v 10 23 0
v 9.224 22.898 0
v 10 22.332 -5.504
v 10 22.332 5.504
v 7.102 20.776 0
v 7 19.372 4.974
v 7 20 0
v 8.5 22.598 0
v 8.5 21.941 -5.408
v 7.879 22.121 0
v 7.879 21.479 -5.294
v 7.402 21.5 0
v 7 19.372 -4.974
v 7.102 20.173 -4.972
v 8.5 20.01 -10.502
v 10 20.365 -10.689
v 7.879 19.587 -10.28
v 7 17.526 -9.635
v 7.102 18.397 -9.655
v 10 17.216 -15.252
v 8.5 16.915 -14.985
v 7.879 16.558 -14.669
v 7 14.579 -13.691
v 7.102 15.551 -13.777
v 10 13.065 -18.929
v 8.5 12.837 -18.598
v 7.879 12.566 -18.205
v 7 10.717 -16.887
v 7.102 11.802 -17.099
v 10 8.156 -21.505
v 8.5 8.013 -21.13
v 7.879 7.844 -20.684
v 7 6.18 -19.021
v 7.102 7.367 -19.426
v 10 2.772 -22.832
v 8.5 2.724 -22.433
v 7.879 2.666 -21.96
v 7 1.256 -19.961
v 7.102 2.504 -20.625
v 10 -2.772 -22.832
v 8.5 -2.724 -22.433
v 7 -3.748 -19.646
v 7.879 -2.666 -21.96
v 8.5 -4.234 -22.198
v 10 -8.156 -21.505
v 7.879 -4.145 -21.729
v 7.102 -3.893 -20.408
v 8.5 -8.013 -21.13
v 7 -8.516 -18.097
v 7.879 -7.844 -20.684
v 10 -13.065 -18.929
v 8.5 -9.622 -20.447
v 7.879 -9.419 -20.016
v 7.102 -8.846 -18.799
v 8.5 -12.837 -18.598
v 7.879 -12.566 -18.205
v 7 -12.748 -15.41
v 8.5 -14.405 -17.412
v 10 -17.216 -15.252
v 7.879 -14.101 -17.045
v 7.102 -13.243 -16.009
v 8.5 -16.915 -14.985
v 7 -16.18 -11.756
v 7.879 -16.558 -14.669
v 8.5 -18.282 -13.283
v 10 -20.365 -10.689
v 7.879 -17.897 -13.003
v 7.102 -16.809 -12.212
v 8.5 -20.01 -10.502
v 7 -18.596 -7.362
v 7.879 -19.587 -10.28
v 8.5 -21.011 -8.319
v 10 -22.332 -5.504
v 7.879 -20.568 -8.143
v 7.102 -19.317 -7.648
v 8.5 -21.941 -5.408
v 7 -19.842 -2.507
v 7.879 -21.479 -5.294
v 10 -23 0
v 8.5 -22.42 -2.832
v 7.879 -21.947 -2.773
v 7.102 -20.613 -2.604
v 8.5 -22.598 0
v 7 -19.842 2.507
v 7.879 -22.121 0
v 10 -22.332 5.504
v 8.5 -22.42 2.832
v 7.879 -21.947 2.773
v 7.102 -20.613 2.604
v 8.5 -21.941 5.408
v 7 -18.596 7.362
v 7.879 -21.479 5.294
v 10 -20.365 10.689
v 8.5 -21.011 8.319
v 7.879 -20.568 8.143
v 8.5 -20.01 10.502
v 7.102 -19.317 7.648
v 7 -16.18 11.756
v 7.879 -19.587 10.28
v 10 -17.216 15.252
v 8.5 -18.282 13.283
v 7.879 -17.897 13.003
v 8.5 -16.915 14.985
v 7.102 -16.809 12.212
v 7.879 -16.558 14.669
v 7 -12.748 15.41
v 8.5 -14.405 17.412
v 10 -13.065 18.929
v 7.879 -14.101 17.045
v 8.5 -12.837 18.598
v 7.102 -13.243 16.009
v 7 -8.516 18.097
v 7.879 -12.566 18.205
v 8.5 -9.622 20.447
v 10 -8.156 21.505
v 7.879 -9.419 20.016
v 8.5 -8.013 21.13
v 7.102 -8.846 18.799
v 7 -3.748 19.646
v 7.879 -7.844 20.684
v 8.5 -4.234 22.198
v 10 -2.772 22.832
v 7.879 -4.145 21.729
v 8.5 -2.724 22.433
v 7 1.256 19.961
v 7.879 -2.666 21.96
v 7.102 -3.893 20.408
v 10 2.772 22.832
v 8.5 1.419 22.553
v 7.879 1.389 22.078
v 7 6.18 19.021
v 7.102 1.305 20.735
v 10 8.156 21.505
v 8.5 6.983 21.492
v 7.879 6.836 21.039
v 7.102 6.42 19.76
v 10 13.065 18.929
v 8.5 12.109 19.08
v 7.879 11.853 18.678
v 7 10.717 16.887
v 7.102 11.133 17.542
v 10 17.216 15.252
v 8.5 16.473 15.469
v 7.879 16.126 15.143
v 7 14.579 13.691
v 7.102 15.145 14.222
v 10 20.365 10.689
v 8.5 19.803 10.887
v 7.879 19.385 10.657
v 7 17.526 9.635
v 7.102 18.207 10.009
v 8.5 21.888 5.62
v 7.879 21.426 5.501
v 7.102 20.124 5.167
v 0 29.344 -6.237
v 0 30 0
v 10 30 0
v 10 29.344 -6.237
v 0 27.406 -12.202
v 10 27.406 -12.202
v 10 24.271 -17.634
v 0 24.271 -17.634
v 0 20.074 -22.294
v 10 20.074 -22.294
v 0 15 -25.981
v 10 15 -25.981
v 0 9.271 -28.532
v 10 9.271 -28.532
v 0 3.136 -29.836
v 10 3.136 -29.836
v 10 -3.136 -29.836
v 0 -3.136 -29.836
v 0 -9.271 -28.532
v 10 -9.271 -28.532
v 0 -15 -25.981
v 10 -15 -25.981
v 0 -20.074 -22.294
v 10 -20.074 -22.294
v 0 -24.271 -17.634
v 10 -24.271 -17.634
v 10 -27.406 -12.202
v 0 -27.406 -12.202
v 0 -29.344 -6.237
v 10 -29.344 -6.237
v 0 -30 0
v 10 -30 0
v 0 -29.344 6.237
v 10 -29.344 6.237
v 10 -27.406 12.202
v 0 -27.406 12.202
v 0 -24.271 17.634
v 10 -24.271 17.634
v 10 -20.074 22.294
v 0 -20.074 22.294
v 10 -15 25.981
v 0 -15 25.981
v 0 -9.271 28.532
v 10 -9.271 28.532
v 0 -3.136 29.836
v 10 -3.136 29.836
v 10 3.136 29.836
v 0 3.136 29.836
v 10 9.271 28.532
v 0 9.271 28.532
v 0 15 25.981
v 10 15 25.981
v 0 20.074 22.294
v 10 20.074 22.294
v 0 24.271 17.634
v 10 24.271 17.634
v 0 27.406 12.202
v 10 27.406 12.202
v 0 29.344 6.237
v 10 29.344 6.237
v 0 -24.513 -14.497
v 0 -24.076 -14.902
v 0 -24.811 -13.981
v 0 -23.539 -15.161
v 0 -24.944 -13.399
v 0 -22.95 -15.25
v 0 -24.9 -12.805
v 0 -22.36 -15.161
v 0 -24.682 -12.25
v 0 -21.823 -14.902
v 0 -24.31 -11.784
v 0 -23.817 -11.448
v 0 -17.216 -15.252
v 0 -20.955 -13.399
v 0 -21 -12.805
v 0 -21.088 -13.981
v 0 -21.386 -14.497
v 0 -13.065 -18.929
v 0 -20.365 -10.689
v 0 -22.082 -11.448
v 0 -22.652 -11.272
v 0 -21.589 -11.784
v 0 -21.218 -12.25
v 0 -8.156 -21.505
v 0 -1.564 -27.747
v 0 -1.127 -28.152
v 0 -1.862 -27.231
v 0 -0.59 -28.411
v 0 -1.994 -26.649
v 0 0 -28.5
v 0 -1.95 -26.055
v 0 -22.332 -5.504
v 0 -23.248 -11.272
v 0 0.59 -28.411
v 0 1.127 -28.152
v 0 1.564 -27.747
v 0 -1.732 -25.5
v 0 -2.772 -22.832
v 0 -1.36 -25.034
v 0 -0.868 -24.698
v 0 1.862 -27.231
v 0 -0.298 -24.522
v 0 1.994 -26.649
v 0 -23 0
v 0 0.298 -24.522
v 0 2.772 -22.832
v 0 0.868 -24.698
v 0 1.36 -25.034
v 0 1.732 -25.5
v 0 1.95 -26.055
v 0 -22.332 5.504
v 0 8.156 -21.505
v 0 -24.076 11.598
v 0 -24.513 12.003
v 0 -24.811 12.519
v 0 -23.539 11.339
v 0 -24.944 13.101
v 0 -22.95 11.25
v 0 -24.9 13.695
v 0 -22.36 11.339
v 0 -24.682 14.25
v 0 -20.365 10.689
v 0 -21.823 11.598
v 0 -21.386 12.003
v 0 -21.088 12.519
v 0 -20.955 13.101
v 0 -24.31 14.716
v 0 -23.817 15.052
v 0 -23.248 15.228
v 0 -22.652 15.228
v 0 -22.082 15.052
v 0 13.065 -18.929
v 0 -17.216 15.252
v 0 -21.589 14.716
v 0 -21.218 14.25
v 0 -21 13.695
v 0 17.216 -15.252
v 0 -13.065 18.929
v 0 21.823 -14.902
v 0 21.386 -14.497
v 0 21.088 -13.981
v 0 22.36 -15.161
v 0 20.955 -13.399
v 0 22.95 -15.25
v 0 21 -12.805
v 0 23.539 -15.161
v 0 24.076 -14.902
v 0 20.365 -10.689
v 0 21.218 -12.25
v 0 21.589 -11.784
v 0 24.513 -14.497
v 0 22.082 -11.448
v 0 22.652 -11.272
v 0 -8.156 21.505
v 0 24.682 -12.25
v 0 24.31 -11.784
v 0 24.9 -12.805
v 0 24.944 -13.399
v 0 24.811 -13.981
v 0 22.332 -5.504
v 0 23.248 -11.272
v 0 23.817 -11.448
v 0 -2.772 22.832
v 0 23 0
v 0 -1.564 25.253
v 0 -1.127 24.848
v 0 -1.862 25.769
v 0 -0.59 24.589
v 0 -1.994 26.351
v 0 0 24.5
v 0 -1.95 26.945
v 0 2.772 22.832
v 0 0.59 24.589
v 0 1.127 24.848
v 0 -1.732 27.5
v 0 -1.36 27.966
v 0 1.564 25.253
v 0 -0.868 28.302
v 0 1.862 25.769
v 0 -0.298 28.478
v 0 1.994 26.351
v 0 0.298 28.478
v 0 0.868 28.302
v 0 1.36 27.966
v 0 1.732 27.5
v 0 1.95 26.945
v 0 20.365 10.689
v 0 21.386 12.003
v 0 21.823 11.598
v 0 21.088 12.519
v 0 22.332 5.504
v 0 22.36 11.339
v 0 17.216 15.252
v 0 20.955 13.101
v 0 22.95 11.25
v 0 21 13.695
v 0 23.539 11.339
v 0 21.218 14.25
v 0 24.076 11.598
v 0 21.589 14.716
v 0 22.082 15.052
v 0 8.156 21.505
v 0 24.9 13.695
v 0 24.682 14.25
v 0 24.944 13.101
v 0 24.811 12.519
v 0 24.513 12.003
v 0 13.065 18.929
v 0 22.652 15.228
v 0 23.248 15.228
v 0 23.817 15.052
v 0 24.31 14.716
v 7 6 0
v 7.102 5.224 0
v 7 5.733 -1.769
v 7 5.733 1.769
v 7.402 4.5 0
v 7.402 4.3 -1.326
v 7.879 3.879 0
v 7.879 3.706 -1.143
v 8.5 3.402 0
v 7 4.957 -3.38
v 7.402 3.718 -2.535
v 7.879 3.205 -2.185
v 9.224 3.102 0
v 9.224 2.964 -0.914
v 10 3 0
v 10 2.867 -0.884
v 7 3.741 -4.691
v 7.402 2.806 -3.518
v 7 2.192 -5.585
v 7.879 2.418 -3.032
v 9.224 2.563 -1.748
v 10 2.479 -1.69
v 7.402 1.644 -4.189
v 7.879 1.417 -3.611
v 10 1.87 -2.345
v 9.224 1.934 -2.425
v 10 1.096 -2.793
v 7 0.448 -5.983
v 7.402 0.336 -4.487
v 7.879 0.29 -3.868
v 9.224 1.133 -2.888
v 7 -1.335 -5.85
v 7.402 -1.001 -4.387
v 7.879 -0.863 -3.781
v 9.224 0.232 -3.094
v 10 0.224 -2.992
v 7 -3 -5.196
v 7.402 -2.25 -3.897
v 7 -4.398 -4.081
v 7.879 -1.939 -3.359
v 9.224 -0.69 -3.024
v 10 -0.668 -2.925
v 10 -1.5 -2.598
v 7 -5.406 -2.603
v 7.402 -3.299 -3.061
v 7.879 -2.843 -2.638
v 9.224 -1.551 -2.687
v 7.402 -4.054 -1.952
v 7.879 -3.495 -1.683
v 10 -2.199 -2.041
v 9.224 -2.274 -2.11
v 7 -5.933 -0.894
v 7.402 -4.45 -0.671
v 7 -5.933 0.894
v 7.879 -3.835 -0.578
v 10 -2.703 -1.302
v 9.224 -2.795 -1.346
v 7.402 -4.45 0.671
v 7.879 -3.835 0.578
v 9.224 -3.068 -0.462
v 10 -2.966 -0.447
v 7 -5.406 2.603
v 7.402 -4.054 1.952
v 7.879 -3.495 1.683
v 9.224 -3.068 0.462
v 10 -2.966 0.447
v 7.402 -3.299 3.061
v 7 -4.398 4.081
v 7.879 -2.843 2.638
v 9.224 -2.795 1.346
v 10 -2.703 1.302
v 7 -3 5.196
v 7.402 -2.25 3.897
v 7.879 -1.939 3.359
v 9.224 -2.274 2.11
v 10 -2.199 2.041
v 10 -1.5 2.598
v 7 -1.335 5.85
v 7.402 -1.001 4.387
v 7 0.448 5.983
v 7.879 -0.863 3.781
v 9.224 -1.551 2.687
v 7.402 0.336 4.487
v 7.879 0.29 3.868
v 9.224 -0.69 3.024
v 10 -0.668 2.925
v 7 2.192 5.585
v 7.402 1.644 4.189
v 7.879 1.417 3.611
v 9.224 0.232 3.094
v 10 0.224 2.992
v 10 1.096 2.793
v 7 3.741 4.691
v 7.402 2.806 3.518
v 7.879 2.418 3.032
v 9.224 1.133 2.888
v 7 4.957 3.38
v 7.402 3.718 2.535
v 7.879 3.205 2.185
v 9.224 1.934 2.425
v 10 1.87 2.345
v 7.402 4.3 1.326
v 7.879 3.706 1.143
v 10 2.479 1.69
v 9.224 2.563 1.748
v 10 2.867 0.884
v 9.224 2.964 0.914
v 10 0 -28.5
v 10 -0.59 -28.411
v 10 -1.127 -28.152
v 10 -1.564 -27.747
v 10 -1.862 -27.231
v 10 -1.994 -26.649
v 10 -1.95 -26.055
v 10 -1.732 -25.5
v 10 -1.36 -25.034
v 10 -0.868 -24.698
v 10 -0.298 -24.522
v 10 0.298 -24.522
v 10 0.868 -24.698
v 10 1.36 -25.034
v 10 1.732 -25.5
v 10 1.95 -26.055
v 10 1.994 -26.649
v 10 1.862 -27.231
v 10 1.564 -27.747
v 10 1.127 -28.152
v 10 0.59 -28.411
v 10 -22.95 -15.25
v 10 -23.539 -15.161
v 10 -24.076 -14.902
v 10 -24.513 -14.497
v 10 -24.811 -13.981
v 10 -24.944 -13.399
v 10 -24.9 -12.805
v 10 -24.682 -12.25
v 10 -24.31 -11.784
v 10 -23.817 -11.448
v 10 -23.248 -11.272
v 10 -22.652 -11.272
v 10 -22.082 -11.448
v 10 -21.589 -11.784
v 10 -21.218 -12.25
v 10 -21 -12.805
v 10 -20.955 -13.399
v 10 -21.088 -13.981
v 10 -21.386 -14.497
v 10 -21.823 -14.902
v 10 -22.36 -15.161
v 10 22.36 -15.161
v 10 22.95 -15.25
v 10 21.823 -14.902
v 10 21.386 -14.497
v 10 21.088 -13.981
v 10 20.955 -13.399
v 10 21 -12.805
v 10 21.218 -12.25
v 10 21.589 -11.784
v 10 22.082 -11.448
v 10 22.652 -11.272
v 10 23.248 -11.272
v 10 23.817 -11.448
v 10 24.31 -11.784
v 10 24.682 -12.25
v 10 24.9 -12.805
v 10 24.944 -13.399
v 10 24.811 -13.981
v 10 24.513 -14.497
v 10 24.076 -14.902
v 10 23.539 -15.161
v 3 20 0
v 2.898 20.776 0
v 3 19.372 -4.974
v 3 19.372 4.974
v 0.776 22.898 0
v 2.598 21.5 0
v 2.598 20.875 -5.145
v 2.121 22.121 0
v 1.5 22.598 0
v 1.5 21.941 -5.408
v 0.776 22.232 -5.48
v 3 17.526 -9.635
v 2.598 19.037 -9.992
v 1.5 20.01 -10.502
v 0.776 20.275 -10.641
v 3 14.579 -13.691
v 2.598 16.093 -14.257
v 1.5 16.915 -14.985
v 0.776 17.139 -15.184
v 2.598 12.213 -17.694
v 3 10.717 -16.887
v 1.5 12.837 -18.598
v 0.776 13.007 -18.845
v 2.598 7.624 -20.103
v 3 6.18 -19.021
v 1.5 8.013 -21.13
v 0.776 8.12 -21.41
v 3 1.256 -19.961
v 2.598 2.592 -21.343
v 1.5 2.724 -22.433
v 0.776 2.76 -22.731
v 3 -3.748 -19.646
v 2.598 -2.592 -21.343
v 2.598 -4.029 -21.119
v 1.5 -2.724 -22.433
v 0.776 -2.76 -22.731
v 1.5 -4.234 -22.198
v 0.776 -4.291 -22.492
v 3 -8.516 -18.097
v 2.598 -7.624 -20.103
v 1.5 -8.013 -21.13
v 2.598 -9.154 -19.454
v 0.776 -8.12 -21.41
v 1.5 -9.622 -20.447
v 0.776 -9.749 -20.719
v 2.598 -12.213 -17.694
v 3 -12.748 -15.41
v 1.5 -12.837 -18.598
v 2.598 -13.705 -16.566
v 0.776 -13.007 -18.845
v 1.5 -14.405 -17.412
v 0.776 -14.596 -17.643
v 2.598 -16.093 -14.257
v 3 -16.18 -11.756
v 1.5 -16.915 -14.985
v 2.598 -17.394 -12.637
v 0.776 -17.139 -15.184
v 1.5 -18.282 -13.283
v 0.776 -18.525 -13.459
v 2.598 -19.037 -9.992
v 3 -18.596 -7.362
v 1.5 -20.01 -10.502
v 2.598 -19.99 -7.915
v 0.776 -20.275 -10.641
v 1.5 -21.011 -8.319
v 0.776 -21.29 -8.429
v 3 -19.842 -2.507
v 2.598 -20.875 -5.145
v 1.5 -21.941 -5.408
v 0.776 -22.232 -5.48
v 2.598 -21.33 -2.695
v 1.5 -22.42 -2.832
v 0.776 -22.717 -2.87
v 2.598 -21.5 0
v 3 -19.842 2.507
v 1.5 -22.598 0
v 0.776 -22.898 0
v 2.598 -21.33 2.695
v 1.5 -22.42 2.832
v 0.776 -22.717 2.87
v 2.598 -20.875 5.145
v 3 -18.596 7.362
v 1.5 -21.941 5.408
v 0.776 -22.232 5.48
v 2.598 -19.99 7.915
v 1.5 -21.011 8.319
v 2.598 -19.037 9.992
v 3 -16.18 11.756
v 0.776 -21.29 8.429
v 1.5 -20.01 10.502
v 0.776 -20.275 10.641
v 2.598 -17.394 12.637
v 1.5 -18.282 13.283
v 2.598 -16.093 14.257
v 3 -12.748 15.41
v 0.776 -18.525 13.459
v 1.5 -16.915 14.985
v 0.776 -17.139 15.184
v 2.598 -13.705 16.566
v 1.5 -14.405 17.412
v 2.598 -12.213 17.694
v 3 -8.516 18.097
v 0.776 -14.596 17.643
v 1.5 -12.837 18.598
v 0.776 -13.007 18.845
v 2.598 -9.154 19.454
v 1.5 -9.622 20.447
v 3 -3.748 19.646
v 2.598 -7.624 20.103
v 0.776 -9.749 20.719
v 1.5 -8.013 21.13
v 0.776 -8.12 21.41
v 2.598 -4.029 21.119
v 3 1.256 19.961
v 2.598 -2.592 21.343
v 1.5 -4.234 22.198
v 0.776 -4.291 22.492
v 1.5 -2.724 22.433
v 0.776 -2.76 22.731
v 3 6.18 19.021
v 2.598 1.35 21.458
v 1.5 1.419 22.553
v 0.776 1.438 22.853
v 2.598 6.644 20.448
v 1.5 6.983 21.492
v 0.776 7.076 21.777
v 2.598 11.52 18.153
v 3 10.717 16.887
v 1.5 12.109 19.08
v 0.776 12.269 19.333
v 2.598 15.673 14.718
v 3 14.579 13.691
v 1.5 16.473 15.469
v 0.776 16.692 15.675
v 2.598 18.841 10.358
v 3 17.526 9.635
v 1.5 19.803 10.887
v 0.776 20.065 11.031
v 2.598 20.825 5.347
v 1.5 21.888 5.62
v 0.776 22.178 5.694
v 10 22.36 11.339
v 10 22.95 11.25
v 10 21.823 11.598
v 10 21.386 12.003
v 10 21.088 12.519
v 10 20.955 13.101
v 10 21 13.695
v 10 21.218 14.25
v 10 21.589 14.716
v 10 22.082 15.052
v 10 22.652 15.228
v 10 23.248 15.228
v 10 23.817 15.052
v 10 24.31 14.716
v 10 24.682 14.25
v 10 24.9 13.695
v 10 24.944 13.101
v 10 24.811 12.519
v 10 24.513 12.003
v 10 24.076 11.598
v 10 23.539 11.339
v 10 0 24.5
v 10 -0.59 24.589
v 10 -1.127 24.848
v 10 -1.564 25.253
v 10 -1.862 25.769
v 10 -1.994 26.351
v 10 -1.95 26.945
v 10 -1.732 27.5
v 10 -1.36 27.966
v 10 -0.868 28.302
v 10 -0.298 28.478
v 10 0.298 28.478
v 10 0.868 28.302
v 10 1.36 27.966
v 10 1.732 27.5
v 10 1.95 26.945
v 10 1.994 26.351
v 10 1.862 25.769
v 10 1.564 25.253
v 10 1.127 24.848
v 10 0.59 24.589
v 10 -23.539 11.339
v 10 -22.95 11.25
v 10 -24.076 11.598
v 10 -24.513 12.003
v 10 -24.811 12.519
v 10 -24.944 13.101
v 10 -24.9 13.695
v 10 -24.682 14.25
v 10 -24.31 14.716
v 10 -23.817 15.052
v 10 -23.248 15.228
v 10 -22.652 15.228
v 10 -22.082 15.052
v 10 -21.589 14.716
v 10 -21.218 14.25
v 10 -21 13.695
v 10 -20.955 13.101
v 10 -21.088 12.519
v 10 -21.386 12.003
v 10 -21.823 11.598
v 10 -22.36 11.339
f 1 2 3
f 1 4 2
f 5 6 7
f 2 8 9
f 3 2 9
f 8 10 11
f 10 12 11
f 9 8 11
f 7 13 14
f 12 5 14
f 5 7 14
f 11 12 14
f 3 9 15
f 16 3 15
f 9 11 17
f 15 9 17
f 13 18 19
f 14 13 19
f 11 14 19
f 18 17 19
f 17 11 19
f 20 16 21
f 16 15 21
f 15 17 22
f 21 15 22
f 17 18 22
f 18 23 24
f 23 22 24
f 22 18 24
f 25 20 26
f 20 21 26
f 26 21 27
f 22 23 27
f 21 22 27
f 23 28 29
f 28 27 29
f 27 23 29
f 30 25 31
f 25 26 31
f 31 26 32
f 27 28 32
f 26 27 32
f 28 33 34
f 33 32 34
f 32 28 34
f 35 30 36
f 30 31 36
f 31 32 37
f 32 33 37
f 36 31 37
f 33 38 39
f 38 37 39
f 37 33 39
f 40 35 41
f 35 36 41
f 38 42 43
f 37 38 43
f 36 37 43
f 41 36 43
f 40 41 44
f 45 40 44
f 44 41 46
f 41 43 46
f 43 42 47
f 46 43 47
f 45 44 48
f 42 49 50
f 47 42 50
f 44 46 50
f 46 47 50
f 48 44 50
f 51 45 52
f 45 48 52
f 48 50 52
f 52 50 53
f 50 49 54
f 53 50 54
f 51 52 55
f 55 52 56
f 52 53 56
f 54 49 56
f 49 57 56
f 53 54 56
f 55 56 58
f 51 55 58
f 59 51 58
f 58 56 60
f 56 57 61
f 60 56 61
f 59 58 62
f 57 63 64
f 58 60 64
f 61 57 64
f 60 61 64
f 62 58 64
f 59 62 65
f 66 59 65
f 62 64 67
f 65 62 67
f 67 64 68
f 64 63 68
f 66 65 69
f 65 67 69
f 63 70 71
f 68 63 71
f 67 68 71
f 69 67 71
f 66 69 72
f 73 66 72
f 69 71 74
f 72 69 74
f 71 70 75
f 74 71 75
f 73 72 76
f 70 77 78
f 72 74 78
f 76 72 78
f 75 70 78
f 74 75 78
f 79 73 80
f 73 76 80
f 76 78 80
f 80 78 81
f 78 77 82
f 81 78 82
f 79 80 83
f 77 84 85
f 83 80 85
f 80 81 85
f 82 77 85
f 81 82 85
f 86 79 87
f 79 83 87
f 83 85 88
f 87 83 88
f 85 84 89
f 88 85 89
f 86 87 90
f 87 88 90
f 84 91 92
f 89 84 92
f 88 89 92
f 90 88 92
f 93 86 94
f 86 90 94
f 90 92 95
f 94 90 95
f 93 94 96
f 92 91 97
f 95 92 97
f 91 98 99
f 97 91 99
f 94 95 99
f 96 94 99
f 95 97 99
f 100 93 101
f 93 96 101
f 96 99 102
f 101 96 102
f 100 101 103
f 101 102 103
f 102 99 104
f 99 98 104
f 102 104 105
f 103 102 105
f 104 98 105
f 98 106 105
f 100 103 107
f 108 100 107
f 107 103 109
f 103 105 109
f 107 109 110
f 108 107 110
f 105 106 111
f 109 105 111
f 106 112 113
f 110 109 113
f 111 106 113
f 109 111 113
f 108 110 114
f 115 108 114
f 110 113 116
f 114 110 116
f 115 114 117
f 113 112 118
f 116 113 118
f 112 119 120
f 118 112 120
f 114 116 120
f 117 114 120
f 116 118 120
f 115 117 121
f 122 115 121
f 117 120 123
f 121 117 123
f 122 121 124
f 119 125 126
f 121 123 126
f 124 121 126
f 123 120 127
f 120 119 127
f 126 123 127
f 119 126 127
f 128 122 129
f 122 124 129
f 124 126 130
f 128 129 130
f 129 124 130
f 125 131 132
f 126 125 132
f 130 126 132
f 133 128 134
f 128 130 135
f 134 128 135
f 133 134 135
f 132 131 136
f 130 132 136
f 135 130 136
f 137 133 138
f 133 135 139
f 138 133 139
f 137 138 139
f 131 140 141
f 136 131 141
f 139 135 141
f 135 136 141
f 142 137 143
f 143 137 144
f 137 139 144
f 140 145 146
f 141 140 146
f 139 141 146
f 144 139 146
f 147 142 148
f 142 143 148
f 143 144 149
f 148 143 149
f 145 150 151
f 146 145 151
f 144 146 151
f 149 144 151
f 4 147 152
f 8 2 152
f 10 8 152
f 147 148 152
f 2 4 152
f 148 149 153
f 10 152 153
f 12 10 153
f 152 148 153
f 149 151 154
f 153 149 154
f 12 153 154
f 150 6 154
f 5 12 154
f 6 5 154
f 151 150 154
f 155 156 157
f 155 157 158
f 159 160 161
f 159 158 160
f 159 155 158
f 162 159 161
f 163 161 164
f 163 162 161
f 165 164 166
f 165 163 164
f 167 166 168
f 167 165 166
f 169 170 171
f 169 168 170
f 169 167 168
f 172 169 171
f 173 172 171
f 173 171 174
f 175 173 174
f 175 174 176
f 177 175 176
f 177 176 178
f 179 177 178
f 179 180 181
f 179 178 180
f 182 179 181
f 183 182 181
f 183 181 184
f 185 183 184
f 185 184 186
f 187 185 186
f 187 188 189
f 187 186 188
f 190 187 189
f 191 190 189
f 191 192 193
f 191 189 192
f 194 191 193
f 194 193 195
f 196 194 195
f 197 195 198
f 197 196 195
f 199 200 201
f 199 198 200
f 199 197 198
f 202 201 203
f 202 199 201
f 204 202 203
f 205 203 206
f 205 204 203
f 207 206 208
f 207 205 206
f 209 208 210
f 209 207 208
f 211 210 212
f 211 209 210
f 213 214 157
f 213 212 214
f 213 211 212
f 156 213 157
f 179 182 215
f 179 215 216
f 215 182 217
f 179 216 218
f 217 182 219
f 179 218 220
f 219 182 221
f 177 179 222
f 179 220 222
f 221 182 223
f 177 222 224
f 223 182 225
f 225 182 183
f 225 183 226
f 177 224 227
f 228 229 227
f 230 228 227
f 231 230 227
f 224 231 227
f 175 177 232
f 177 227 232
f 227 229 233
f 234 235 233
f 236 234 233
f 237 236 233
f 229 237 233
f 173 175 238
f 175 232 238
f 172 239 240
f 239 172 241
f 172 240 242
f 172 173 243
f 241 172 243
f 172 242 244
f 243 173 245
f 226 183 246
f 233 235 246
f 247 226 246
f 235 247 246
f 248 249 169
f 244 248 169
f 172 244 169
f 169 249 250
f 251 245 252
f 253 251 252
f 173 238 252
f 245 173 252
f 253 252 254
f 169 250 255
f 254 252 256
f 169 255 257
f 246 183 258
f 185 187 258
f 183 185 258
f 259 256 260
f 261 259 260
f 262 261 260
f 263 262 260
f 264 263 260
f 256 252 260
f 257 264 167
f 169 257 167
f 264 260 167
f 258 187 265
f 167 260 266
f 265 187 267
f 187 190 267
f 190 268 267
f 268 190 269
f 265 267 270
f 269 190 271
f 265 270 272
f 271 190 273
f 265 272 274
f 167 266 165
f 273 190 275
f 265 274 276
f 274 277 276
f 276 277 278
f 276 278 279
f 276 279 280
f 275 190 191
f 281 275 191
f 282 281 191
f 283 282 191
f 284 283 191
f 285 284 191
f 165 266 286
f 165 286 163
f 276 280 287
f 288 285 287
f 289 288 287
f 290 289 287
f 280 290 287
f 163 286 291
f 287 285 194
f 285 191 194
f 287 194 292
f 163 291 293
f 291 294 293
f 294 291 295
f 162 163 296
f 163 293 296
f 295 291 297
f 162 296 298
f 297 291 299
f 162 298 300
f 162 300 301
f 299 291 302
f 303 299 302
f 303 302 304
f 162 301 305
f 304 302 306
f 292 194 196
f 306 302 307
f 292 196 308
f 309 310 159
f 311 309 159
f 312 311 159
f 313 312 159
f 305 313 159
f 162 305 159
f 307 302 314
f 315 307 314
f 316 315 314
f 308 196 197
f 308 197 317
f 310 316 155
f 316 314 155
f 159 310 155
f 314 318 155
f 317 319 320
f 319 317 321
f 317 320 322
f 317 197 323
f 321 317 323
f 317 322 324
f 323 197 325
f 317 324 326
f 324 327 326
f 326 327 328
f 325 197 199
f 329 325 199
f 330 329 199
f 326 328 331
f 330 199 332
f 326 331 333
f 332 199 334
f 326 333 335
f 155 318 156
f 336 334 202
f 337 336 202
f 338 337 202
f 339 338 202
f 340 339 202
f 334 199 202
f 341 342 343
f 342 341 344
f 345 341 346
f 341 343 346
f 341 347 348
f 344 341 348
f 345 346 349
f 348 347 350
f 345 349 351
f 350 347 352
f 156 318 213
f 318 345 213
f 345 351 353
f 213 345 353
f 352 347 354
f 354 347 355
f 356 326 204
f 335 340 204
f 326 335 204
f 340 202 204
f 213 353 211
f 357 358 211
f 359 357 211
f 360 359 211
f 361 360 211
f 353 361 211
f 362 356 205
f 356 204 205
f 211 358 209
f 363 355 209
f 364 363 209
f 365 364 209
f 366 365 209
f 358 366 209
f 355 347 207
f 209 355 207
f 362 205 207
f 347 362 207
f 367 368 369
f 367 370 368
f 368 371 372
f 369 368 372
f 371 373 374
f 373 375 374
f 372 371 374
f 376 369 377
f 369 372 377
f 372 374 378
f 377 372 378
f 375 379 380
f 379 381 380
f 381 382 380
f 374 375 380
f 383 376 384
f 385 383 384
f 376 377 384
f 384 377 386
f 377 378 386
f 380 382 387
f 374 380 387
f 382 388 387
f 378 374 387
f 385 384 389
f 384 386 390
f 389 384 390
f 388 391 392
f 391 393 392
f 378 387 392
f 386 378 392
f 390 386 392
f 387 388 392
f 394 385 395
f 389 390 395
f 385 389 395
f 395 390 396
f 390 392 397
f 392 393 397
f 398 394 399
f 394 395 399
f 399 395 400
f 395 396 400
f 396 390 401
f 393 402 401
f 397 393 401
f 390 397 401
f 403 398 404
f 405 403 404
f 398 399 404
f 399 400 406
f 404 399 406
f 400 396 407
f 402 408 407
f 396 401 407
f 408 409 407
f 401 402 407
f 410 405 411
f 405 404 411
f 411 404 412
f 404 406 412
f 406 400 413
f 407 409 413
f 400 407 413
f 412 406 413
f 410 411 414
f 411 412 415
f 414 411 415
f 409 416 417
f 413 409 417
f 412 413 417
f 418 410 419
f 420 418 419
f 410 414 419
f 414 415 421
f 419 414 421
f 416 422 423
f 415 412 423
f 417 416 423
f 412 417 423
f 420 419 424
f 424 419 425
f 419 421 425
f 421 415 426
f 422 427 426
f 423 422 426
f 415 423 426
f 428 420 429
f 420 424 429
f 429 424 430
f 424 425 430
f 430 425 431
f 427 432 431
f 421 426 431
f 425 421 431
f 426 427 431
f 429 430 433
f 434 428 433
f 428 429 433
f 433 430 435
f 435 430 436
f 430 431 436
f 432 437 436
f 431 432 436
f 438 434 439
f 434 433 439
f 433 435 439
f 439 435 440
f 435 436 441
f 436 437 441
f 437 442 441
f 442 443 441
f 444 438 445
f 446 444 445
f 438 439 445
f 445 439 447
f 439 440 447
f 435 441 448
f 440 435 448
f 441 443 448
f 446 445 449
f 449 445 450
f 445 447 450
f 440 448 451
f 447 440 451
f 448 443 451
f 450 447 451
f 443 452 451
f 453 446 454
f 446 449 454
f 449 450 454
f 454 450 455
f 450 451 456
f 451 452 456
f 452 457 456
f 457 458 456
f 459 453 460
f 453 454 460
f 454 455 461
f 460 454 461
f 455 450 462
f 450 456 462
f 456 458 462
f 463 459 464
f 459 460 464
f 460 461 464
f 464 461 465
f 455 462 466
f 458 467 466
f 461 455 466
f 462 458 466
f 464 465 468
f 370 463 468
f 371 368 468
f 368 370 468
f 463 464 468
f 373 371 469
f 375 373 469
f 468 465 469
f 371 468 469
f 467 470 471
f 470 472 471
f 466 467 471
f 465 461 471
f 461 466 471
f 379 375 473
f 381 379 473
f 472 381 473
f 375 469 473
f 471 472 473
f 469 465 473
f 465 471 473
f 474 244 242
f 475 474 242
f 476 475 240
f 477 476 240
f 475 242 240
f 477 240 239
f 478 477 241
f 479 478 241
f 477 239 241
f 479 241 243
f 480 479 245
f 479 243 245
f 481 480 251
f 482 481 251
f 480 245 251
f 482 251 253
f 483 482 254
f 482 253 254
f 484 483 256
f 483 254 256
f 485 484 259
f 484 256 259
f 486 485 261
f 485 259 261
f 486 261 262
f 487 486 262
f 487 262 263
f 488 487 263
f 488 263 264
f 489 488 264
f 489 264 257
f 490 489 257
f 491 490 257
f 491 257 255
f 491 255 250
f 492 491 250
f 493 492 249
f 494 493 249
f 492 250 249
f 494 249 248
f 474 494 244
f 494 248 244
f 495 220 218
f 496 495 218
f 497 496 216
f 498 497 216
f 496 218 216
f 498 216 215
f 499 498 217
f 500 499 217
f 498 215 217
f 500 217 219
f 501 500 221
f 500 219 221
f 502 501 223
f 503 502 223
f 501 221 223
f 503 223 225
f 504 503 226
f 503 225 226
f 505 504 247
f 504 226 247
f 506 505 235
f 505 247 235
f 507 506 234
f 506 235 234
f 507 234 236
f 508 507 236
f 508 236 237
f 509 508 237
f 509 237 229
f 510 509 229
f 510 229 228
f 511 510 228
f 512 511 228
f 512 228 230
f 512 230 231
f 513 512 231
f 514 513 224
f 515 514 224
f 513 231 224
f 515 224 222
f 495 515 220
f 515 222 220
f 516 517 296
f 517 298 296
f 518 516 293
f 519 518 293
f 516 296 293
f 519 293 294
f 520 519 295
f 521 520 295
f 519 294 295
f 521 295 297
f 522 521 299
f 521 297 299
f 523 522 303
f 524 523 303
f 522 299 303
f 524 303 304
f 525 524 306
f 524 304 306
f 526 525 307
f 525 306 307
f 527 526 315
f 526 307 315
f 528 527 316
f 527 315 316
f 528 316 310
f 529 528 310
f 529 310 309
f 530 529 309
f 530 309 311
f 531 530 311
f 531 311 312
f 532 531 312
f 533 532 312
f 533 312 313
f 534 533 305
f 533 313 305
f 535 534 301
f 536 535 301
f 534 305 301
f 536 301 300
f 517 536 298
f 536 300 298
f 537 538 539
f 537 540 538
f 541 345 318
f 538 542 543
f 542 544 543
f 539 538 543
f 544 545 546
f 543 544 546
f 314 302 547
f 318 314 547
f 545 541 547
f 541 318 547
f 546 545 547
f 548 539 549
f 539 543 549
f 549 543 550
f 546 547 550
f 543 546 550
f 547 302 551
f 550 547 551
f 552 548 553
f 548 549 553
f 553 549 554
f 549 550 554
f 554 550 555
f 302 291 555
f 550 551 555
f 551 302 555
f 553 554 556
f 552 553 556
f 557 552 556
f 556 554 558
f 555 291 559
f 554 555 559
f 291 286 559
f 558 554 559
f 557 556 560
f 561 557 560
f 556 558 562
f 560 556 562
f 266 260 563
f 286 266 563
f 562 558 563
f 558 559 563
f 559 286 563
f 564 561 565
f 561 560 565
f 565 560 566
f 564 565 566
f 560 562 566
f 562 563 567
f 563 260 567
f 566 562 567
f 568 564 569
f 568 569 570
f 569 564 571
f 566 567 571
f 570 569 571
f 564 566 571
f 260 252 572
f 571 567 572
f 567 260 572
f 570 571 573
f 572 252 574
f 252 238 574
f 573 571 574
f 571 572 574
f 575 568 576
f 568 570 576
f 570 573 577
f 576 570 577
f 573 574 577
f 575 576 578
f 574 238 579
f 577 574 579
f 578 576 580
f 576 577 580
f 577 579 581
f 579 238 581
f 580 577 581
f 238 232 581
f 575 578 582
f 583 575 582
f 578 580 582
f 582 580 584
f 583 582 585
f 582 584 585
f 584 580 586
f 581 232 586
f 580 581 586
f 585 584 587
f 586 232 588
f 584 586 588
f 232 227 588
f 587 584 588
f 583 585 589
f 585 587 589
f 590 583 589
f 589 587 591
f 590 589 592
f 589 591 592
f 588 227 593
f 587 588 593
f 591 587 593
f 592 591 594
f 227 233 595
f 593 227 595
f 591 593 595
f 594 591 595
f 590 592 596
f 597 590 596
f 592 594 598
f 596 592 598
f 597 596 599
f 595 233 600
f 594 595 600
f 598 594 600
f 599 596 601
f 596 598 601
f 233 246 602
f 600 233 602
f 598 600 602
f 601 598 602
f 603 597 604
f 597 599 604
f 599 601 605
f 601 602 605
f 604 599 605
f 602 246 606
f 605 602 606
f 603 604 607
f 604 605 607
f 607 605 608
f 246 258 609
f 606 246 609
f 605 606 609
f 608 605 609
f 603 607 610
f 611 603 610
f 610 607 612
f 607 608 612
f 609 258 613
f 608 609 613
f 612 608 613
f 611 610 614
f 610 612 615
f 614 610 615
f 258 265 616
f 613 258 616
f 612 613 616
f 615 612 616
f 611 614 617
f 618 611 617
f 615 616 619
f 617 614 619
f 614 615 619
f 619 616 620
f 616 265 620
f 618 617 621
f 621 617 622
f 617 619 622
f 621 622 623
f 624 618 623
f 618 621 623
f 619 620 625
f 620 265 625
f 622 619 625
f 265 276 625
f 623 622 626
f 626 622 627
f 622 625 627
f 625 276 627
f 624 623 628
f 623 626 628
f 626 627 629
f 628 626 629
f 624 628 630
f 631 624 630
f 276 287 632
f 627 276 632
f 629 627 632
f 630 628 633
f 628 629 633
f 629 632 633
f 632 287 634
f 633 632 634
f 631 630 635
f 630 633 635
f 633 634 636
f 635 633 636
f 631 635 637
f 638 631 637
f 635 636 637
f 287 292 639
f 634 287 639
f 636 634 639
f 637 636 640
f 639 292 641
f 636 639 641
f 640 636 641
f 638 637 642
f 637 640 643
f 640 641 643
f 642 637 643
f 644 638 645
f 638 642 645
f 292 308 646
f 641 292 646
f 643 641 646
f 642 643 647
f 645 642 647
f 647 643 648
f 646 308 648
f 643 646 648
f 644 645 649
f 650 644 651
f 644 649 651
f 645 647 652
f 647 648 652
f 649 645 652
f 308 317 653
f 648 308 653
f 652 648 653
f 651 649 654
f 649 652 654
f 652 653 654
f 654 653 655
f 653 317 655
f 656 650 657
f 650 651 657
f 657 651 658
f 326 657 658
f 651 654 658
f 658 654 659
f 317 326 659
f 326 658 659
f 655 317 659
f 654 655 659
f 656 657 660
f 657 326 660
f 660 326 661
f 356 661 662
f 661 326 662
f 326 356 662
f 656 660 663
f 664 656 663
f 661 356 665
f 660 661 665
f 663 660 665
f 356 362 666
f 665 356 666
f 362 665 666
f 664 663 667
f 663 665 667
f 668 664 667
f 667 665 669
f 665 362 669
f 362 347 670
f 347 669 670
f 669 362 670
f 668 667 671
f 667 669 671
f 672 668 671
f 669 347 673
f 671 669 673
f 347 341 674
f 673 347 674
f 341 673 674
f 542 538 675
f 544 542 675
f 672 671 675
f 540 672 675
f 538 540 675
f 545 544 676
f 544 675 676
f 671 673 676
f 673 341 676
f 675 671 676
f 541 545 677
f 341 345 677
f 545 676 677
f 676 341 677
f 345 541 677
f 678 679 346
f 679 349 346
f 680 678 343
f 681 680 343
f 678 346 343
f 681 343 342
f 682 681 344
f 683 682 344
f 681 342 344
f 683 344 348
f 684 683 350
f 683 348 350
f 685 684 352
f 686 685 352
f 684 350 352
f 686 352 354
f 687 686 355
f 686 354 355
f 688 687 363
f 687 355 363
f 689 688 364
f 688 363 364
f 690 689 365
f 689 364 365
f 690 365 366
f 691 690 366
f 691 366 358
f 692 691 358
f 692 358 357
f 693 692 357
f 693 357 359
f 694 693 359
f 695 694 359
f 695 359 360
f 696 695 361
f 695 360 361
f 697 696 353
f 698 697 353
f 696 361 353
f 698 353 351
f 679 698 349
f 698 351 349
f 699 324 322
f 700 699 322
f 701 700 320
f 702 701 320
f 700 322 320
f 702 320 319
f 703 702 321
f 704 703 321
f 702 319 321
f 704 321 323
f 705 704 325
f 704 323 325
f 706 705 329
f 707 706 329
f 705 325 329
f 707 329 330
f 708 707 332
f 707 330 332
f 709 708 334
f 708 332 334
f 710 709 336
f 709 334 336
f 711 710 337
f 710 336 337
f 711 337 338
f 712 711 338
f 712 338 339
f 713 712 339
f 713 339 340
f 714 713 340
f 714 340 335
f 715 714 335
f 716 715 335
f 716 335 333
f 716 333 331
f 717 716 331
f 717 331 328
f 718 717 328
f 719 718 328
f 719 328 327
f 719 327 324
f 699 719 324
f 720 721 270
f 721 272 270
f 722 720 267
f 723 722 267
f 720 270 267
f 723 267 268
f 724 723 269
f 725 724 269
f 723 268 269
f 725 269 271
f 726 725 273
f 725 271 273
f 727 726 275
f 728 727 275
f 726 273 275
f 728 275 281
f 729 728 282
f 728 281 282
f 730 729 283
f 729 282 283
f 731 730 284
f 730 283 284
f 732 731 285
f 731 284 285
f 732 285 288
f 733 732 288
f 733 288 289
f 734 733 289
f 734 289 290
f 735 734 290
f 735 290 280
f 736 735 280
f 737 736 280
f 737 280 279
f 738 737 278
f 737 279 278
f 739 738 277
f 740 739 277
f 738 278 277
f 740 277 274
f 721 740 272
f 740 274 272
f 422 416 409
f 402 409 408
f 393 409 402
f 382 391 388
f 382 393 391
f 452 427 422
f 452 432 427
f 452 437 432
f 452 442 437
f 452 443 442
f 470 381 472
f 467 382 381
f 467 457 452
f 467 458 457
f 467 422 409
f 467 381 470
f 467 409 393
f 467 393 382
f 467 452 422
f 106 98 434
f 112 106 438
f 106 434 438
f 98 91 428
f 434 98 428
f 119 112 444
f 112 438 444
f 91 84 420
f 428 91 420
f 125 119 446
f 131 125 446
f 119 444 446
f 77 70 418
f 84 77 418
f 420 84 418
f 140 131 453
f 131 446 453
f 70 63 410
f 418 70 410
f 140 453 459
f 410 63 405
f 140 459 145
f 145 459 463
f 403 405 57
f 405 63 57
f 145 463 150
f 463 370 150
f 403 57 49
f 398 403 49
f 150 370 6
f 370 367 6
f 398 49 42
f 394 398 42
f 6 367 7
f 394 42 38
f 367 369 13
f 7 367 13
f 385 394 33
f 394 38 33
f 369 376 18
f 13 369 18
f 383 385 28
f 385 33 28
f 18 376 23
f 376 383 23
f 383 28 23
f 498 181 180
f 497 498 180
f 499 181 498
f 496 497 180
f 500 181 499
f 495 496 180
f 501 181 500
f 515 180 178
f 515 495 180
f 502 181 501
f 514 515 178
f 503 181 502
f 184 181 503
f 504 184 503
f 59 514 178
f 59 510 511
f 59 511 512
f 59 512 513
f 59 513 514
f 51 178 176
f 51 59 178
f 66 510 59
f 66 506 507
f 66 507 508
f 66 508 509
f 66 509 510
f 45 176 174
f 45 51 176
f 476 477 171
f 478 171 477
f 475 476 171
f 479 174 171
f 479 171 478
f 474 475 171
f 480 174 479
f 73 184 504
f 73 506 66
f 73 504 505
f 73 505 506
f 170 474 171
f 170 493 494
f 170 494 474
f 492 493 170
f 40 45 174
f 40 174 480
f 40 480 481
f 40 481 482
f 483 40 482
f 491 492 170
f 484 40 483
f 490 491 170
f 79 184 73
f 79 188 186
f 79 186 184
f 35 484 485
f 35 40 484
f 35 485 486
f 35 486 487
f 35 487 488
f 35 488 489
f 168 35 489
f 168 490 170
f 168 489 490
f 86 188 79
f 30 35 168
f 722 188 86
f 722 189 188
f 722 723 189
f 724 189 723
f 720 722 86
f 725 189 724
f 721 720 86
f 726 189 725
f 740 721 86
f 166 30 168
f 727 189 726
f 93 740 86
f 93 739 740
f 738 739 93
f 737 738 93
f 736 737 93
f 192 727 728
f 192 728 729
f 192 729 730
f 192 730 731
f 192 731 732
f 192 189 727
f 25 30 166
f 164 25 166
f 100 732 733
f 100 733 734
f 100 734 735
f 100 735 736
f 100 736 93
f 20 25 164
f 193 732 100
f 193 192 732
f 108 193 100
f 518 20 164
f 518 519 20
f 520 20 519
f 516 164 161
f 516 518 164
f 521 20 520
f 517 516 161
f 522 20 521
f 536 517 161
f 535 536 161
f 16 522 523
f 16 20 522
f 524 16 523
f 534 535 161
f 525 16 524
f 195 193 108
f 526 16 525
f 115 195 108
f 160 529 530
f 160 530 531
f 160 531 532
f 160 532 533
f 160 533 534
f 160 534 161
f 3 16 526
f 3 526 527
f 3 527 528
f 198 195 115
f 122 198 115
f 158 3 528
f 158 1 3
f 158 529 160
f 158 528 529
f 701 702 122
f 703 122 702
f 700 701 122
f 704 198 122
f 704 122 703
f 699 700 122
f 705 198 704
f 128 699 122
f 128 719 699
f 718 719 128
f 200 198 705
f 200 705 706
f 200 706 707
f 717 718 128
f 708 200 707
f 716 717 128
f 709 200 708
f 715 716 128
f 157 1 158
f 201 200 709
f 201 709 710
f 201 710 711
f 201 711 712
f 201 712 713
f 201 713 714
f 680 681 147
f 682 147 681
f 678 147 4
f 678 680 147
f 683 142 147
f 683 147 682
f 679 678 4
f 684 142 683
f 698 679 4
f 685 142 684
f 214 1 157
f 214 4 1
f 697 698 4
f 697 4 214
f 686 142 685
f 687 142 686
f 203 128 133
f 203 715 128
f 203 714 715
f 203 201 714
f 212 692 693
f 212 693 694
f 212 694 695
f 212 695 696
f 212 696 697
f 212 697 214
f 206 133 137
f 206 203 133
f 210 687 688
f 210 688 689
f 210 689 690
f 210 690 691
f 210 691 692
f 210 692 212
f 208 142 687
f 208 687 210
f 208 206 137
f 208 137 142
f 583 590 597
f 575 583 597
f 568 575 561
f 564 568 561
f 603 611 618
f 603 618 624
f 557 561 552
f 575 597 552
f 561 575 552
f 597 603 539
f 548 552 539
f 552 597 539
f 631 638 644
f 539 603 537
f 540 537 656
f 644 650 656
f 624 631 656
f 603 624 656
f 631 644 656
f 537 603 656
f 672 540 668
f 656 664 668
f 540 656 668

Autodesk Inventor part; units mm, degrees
ref_plane "YZ Plane" through (0, 0, 0) normal (1, 0, 0) x (0, 1, 0)
ref_plane "XZ Plane" through (0, 0, 0) normal (0, 1, 0) x (-1, 0, 0)
ref_plane "XY Plane" through (0, 0, 0) normal (0, 0, 1) x (1, 0, 0)
sketch "Эскиз1" plane through (0, 0, 0) normal (0, 0, 1) x (1, 0, 0)
  line L0 (0, 0) -> (10, 0)
  line L1 (10, 0) -> (10, 30)
  line L2 (10, 30) -> (0, 30)
  line L3 (0, 30) -> (0, 0)
  dimension "d0" = 10
  dimension "d1" = 30
revolve "Вращение1" add sketch "Эскиз1" angle 360 about axis through (0, 0, 0) along (1, 0, 0)
sketch "Эскиз2" plane through (0, 0, 0) normal (0, 0, 1) x (1, 0, 0)
  line L0 (0, 0) -> (10, 0)
  line L1 (10, -30) -> (10, 30) projected
  arc A0 (3, 20) -> (0, 23) centre (0, 20) ccw
  line L2 (3, 20) -> (0, 20) construction
  line L3 (0, 23) -> (0, 20) construction
  line L4 (7, 20) -> (7, 10)
  arc A1 (7, 6) -> (10, 3) centre (10, 6) ccw
  line L5 (7, 6) -> (10, 6) construction
  line L6 (10, 3) -> (10, 6) construction
  arc A2 (10, 23) -> (7, 20) centre (10, 20) ccw
  line L7 (7, 20) -> (10, 20) construction
  line L8 (10, 23) -> (10, 20) construction
  line L9 (7, 10) -> (7, 6)
  line L10 (0, -30) -> (0, 30) projected
  line L11 (0, 0) -> (0, 23)
  line L12 (10, 3) -> (10, 23)
  line L13 (3, 20) -> (3, 0)
  point P0 (10, 3)
  point P1 (10, 23)
  dimension "d4" = 3
  dimension "d5" = 90
  dimension "d6" = 3
  dimension "d7" = 90
  dimension "d8" = 3
  dimension "d9" = 90
  dimension "d10" = 3
  dimension "d12" = 20
  dimension "d14" = 20
revolve "Вращение2" cut sketch "Эскиз2" angle 360 about axis through (0, 0, 0) along (-1, 0, 0) contours A1 L9 L4 A2 L1
sketch "Эскиз3" plane through (10, 0, 0) normal (1, 0, 0) x (0, 0, -1)
  point P0 (0, 0)
  point P1 (26.5, 0)
  point P2 (13.25, 22.9497)
  point P3 (-13.25, 22.9497)
  point P4 (-26.5, 0)
  point P5 (-13.25, -22.9497)
  point P6 (13.25, -22.9497)
  dimension "d15" = 26.5
  dimension "d18" = 360
hole "Отверстие1" at (10, 0, -26.5) at (10, 22.9497, -13.25) at (10, 22.9497, 13.25) at (10, 0, 26.5) at (10, -22.9497, 13.25) at (10, -22.9497, -13.25) direction (-1, 0, 0) diameter 4 end through all
sketch "Эскиз4" plane through (0, 0, 0) normal (0, 0, 1) x (1, 0, 0)
  line L0 (0, 0) -> (10, 0)
  line L1 (10, 2) -> (10, -2) projected
  line L2 (0, 0) -> (3, 0)
  line L3 (3, 0) -> (3, 20)
  line L4 (0, 23) -> (0, 23)
  line L5 (0, 23) -> (0, 0)
  arc A0 (10, 23) -> (7, 20) centre (10, 20) ccw construction
  arc A1 (3, 20) -> (0, 23) centre (0, 20) ccw
  dimension "d29" = 3
revolve "Вращение3" cut sketch "Эскиз4" angle 360 about axis through (0, 0, 0) along (1, 0, 0)
equation "\"d25\" = d15"
properties part number "711126 (Доделать)"
